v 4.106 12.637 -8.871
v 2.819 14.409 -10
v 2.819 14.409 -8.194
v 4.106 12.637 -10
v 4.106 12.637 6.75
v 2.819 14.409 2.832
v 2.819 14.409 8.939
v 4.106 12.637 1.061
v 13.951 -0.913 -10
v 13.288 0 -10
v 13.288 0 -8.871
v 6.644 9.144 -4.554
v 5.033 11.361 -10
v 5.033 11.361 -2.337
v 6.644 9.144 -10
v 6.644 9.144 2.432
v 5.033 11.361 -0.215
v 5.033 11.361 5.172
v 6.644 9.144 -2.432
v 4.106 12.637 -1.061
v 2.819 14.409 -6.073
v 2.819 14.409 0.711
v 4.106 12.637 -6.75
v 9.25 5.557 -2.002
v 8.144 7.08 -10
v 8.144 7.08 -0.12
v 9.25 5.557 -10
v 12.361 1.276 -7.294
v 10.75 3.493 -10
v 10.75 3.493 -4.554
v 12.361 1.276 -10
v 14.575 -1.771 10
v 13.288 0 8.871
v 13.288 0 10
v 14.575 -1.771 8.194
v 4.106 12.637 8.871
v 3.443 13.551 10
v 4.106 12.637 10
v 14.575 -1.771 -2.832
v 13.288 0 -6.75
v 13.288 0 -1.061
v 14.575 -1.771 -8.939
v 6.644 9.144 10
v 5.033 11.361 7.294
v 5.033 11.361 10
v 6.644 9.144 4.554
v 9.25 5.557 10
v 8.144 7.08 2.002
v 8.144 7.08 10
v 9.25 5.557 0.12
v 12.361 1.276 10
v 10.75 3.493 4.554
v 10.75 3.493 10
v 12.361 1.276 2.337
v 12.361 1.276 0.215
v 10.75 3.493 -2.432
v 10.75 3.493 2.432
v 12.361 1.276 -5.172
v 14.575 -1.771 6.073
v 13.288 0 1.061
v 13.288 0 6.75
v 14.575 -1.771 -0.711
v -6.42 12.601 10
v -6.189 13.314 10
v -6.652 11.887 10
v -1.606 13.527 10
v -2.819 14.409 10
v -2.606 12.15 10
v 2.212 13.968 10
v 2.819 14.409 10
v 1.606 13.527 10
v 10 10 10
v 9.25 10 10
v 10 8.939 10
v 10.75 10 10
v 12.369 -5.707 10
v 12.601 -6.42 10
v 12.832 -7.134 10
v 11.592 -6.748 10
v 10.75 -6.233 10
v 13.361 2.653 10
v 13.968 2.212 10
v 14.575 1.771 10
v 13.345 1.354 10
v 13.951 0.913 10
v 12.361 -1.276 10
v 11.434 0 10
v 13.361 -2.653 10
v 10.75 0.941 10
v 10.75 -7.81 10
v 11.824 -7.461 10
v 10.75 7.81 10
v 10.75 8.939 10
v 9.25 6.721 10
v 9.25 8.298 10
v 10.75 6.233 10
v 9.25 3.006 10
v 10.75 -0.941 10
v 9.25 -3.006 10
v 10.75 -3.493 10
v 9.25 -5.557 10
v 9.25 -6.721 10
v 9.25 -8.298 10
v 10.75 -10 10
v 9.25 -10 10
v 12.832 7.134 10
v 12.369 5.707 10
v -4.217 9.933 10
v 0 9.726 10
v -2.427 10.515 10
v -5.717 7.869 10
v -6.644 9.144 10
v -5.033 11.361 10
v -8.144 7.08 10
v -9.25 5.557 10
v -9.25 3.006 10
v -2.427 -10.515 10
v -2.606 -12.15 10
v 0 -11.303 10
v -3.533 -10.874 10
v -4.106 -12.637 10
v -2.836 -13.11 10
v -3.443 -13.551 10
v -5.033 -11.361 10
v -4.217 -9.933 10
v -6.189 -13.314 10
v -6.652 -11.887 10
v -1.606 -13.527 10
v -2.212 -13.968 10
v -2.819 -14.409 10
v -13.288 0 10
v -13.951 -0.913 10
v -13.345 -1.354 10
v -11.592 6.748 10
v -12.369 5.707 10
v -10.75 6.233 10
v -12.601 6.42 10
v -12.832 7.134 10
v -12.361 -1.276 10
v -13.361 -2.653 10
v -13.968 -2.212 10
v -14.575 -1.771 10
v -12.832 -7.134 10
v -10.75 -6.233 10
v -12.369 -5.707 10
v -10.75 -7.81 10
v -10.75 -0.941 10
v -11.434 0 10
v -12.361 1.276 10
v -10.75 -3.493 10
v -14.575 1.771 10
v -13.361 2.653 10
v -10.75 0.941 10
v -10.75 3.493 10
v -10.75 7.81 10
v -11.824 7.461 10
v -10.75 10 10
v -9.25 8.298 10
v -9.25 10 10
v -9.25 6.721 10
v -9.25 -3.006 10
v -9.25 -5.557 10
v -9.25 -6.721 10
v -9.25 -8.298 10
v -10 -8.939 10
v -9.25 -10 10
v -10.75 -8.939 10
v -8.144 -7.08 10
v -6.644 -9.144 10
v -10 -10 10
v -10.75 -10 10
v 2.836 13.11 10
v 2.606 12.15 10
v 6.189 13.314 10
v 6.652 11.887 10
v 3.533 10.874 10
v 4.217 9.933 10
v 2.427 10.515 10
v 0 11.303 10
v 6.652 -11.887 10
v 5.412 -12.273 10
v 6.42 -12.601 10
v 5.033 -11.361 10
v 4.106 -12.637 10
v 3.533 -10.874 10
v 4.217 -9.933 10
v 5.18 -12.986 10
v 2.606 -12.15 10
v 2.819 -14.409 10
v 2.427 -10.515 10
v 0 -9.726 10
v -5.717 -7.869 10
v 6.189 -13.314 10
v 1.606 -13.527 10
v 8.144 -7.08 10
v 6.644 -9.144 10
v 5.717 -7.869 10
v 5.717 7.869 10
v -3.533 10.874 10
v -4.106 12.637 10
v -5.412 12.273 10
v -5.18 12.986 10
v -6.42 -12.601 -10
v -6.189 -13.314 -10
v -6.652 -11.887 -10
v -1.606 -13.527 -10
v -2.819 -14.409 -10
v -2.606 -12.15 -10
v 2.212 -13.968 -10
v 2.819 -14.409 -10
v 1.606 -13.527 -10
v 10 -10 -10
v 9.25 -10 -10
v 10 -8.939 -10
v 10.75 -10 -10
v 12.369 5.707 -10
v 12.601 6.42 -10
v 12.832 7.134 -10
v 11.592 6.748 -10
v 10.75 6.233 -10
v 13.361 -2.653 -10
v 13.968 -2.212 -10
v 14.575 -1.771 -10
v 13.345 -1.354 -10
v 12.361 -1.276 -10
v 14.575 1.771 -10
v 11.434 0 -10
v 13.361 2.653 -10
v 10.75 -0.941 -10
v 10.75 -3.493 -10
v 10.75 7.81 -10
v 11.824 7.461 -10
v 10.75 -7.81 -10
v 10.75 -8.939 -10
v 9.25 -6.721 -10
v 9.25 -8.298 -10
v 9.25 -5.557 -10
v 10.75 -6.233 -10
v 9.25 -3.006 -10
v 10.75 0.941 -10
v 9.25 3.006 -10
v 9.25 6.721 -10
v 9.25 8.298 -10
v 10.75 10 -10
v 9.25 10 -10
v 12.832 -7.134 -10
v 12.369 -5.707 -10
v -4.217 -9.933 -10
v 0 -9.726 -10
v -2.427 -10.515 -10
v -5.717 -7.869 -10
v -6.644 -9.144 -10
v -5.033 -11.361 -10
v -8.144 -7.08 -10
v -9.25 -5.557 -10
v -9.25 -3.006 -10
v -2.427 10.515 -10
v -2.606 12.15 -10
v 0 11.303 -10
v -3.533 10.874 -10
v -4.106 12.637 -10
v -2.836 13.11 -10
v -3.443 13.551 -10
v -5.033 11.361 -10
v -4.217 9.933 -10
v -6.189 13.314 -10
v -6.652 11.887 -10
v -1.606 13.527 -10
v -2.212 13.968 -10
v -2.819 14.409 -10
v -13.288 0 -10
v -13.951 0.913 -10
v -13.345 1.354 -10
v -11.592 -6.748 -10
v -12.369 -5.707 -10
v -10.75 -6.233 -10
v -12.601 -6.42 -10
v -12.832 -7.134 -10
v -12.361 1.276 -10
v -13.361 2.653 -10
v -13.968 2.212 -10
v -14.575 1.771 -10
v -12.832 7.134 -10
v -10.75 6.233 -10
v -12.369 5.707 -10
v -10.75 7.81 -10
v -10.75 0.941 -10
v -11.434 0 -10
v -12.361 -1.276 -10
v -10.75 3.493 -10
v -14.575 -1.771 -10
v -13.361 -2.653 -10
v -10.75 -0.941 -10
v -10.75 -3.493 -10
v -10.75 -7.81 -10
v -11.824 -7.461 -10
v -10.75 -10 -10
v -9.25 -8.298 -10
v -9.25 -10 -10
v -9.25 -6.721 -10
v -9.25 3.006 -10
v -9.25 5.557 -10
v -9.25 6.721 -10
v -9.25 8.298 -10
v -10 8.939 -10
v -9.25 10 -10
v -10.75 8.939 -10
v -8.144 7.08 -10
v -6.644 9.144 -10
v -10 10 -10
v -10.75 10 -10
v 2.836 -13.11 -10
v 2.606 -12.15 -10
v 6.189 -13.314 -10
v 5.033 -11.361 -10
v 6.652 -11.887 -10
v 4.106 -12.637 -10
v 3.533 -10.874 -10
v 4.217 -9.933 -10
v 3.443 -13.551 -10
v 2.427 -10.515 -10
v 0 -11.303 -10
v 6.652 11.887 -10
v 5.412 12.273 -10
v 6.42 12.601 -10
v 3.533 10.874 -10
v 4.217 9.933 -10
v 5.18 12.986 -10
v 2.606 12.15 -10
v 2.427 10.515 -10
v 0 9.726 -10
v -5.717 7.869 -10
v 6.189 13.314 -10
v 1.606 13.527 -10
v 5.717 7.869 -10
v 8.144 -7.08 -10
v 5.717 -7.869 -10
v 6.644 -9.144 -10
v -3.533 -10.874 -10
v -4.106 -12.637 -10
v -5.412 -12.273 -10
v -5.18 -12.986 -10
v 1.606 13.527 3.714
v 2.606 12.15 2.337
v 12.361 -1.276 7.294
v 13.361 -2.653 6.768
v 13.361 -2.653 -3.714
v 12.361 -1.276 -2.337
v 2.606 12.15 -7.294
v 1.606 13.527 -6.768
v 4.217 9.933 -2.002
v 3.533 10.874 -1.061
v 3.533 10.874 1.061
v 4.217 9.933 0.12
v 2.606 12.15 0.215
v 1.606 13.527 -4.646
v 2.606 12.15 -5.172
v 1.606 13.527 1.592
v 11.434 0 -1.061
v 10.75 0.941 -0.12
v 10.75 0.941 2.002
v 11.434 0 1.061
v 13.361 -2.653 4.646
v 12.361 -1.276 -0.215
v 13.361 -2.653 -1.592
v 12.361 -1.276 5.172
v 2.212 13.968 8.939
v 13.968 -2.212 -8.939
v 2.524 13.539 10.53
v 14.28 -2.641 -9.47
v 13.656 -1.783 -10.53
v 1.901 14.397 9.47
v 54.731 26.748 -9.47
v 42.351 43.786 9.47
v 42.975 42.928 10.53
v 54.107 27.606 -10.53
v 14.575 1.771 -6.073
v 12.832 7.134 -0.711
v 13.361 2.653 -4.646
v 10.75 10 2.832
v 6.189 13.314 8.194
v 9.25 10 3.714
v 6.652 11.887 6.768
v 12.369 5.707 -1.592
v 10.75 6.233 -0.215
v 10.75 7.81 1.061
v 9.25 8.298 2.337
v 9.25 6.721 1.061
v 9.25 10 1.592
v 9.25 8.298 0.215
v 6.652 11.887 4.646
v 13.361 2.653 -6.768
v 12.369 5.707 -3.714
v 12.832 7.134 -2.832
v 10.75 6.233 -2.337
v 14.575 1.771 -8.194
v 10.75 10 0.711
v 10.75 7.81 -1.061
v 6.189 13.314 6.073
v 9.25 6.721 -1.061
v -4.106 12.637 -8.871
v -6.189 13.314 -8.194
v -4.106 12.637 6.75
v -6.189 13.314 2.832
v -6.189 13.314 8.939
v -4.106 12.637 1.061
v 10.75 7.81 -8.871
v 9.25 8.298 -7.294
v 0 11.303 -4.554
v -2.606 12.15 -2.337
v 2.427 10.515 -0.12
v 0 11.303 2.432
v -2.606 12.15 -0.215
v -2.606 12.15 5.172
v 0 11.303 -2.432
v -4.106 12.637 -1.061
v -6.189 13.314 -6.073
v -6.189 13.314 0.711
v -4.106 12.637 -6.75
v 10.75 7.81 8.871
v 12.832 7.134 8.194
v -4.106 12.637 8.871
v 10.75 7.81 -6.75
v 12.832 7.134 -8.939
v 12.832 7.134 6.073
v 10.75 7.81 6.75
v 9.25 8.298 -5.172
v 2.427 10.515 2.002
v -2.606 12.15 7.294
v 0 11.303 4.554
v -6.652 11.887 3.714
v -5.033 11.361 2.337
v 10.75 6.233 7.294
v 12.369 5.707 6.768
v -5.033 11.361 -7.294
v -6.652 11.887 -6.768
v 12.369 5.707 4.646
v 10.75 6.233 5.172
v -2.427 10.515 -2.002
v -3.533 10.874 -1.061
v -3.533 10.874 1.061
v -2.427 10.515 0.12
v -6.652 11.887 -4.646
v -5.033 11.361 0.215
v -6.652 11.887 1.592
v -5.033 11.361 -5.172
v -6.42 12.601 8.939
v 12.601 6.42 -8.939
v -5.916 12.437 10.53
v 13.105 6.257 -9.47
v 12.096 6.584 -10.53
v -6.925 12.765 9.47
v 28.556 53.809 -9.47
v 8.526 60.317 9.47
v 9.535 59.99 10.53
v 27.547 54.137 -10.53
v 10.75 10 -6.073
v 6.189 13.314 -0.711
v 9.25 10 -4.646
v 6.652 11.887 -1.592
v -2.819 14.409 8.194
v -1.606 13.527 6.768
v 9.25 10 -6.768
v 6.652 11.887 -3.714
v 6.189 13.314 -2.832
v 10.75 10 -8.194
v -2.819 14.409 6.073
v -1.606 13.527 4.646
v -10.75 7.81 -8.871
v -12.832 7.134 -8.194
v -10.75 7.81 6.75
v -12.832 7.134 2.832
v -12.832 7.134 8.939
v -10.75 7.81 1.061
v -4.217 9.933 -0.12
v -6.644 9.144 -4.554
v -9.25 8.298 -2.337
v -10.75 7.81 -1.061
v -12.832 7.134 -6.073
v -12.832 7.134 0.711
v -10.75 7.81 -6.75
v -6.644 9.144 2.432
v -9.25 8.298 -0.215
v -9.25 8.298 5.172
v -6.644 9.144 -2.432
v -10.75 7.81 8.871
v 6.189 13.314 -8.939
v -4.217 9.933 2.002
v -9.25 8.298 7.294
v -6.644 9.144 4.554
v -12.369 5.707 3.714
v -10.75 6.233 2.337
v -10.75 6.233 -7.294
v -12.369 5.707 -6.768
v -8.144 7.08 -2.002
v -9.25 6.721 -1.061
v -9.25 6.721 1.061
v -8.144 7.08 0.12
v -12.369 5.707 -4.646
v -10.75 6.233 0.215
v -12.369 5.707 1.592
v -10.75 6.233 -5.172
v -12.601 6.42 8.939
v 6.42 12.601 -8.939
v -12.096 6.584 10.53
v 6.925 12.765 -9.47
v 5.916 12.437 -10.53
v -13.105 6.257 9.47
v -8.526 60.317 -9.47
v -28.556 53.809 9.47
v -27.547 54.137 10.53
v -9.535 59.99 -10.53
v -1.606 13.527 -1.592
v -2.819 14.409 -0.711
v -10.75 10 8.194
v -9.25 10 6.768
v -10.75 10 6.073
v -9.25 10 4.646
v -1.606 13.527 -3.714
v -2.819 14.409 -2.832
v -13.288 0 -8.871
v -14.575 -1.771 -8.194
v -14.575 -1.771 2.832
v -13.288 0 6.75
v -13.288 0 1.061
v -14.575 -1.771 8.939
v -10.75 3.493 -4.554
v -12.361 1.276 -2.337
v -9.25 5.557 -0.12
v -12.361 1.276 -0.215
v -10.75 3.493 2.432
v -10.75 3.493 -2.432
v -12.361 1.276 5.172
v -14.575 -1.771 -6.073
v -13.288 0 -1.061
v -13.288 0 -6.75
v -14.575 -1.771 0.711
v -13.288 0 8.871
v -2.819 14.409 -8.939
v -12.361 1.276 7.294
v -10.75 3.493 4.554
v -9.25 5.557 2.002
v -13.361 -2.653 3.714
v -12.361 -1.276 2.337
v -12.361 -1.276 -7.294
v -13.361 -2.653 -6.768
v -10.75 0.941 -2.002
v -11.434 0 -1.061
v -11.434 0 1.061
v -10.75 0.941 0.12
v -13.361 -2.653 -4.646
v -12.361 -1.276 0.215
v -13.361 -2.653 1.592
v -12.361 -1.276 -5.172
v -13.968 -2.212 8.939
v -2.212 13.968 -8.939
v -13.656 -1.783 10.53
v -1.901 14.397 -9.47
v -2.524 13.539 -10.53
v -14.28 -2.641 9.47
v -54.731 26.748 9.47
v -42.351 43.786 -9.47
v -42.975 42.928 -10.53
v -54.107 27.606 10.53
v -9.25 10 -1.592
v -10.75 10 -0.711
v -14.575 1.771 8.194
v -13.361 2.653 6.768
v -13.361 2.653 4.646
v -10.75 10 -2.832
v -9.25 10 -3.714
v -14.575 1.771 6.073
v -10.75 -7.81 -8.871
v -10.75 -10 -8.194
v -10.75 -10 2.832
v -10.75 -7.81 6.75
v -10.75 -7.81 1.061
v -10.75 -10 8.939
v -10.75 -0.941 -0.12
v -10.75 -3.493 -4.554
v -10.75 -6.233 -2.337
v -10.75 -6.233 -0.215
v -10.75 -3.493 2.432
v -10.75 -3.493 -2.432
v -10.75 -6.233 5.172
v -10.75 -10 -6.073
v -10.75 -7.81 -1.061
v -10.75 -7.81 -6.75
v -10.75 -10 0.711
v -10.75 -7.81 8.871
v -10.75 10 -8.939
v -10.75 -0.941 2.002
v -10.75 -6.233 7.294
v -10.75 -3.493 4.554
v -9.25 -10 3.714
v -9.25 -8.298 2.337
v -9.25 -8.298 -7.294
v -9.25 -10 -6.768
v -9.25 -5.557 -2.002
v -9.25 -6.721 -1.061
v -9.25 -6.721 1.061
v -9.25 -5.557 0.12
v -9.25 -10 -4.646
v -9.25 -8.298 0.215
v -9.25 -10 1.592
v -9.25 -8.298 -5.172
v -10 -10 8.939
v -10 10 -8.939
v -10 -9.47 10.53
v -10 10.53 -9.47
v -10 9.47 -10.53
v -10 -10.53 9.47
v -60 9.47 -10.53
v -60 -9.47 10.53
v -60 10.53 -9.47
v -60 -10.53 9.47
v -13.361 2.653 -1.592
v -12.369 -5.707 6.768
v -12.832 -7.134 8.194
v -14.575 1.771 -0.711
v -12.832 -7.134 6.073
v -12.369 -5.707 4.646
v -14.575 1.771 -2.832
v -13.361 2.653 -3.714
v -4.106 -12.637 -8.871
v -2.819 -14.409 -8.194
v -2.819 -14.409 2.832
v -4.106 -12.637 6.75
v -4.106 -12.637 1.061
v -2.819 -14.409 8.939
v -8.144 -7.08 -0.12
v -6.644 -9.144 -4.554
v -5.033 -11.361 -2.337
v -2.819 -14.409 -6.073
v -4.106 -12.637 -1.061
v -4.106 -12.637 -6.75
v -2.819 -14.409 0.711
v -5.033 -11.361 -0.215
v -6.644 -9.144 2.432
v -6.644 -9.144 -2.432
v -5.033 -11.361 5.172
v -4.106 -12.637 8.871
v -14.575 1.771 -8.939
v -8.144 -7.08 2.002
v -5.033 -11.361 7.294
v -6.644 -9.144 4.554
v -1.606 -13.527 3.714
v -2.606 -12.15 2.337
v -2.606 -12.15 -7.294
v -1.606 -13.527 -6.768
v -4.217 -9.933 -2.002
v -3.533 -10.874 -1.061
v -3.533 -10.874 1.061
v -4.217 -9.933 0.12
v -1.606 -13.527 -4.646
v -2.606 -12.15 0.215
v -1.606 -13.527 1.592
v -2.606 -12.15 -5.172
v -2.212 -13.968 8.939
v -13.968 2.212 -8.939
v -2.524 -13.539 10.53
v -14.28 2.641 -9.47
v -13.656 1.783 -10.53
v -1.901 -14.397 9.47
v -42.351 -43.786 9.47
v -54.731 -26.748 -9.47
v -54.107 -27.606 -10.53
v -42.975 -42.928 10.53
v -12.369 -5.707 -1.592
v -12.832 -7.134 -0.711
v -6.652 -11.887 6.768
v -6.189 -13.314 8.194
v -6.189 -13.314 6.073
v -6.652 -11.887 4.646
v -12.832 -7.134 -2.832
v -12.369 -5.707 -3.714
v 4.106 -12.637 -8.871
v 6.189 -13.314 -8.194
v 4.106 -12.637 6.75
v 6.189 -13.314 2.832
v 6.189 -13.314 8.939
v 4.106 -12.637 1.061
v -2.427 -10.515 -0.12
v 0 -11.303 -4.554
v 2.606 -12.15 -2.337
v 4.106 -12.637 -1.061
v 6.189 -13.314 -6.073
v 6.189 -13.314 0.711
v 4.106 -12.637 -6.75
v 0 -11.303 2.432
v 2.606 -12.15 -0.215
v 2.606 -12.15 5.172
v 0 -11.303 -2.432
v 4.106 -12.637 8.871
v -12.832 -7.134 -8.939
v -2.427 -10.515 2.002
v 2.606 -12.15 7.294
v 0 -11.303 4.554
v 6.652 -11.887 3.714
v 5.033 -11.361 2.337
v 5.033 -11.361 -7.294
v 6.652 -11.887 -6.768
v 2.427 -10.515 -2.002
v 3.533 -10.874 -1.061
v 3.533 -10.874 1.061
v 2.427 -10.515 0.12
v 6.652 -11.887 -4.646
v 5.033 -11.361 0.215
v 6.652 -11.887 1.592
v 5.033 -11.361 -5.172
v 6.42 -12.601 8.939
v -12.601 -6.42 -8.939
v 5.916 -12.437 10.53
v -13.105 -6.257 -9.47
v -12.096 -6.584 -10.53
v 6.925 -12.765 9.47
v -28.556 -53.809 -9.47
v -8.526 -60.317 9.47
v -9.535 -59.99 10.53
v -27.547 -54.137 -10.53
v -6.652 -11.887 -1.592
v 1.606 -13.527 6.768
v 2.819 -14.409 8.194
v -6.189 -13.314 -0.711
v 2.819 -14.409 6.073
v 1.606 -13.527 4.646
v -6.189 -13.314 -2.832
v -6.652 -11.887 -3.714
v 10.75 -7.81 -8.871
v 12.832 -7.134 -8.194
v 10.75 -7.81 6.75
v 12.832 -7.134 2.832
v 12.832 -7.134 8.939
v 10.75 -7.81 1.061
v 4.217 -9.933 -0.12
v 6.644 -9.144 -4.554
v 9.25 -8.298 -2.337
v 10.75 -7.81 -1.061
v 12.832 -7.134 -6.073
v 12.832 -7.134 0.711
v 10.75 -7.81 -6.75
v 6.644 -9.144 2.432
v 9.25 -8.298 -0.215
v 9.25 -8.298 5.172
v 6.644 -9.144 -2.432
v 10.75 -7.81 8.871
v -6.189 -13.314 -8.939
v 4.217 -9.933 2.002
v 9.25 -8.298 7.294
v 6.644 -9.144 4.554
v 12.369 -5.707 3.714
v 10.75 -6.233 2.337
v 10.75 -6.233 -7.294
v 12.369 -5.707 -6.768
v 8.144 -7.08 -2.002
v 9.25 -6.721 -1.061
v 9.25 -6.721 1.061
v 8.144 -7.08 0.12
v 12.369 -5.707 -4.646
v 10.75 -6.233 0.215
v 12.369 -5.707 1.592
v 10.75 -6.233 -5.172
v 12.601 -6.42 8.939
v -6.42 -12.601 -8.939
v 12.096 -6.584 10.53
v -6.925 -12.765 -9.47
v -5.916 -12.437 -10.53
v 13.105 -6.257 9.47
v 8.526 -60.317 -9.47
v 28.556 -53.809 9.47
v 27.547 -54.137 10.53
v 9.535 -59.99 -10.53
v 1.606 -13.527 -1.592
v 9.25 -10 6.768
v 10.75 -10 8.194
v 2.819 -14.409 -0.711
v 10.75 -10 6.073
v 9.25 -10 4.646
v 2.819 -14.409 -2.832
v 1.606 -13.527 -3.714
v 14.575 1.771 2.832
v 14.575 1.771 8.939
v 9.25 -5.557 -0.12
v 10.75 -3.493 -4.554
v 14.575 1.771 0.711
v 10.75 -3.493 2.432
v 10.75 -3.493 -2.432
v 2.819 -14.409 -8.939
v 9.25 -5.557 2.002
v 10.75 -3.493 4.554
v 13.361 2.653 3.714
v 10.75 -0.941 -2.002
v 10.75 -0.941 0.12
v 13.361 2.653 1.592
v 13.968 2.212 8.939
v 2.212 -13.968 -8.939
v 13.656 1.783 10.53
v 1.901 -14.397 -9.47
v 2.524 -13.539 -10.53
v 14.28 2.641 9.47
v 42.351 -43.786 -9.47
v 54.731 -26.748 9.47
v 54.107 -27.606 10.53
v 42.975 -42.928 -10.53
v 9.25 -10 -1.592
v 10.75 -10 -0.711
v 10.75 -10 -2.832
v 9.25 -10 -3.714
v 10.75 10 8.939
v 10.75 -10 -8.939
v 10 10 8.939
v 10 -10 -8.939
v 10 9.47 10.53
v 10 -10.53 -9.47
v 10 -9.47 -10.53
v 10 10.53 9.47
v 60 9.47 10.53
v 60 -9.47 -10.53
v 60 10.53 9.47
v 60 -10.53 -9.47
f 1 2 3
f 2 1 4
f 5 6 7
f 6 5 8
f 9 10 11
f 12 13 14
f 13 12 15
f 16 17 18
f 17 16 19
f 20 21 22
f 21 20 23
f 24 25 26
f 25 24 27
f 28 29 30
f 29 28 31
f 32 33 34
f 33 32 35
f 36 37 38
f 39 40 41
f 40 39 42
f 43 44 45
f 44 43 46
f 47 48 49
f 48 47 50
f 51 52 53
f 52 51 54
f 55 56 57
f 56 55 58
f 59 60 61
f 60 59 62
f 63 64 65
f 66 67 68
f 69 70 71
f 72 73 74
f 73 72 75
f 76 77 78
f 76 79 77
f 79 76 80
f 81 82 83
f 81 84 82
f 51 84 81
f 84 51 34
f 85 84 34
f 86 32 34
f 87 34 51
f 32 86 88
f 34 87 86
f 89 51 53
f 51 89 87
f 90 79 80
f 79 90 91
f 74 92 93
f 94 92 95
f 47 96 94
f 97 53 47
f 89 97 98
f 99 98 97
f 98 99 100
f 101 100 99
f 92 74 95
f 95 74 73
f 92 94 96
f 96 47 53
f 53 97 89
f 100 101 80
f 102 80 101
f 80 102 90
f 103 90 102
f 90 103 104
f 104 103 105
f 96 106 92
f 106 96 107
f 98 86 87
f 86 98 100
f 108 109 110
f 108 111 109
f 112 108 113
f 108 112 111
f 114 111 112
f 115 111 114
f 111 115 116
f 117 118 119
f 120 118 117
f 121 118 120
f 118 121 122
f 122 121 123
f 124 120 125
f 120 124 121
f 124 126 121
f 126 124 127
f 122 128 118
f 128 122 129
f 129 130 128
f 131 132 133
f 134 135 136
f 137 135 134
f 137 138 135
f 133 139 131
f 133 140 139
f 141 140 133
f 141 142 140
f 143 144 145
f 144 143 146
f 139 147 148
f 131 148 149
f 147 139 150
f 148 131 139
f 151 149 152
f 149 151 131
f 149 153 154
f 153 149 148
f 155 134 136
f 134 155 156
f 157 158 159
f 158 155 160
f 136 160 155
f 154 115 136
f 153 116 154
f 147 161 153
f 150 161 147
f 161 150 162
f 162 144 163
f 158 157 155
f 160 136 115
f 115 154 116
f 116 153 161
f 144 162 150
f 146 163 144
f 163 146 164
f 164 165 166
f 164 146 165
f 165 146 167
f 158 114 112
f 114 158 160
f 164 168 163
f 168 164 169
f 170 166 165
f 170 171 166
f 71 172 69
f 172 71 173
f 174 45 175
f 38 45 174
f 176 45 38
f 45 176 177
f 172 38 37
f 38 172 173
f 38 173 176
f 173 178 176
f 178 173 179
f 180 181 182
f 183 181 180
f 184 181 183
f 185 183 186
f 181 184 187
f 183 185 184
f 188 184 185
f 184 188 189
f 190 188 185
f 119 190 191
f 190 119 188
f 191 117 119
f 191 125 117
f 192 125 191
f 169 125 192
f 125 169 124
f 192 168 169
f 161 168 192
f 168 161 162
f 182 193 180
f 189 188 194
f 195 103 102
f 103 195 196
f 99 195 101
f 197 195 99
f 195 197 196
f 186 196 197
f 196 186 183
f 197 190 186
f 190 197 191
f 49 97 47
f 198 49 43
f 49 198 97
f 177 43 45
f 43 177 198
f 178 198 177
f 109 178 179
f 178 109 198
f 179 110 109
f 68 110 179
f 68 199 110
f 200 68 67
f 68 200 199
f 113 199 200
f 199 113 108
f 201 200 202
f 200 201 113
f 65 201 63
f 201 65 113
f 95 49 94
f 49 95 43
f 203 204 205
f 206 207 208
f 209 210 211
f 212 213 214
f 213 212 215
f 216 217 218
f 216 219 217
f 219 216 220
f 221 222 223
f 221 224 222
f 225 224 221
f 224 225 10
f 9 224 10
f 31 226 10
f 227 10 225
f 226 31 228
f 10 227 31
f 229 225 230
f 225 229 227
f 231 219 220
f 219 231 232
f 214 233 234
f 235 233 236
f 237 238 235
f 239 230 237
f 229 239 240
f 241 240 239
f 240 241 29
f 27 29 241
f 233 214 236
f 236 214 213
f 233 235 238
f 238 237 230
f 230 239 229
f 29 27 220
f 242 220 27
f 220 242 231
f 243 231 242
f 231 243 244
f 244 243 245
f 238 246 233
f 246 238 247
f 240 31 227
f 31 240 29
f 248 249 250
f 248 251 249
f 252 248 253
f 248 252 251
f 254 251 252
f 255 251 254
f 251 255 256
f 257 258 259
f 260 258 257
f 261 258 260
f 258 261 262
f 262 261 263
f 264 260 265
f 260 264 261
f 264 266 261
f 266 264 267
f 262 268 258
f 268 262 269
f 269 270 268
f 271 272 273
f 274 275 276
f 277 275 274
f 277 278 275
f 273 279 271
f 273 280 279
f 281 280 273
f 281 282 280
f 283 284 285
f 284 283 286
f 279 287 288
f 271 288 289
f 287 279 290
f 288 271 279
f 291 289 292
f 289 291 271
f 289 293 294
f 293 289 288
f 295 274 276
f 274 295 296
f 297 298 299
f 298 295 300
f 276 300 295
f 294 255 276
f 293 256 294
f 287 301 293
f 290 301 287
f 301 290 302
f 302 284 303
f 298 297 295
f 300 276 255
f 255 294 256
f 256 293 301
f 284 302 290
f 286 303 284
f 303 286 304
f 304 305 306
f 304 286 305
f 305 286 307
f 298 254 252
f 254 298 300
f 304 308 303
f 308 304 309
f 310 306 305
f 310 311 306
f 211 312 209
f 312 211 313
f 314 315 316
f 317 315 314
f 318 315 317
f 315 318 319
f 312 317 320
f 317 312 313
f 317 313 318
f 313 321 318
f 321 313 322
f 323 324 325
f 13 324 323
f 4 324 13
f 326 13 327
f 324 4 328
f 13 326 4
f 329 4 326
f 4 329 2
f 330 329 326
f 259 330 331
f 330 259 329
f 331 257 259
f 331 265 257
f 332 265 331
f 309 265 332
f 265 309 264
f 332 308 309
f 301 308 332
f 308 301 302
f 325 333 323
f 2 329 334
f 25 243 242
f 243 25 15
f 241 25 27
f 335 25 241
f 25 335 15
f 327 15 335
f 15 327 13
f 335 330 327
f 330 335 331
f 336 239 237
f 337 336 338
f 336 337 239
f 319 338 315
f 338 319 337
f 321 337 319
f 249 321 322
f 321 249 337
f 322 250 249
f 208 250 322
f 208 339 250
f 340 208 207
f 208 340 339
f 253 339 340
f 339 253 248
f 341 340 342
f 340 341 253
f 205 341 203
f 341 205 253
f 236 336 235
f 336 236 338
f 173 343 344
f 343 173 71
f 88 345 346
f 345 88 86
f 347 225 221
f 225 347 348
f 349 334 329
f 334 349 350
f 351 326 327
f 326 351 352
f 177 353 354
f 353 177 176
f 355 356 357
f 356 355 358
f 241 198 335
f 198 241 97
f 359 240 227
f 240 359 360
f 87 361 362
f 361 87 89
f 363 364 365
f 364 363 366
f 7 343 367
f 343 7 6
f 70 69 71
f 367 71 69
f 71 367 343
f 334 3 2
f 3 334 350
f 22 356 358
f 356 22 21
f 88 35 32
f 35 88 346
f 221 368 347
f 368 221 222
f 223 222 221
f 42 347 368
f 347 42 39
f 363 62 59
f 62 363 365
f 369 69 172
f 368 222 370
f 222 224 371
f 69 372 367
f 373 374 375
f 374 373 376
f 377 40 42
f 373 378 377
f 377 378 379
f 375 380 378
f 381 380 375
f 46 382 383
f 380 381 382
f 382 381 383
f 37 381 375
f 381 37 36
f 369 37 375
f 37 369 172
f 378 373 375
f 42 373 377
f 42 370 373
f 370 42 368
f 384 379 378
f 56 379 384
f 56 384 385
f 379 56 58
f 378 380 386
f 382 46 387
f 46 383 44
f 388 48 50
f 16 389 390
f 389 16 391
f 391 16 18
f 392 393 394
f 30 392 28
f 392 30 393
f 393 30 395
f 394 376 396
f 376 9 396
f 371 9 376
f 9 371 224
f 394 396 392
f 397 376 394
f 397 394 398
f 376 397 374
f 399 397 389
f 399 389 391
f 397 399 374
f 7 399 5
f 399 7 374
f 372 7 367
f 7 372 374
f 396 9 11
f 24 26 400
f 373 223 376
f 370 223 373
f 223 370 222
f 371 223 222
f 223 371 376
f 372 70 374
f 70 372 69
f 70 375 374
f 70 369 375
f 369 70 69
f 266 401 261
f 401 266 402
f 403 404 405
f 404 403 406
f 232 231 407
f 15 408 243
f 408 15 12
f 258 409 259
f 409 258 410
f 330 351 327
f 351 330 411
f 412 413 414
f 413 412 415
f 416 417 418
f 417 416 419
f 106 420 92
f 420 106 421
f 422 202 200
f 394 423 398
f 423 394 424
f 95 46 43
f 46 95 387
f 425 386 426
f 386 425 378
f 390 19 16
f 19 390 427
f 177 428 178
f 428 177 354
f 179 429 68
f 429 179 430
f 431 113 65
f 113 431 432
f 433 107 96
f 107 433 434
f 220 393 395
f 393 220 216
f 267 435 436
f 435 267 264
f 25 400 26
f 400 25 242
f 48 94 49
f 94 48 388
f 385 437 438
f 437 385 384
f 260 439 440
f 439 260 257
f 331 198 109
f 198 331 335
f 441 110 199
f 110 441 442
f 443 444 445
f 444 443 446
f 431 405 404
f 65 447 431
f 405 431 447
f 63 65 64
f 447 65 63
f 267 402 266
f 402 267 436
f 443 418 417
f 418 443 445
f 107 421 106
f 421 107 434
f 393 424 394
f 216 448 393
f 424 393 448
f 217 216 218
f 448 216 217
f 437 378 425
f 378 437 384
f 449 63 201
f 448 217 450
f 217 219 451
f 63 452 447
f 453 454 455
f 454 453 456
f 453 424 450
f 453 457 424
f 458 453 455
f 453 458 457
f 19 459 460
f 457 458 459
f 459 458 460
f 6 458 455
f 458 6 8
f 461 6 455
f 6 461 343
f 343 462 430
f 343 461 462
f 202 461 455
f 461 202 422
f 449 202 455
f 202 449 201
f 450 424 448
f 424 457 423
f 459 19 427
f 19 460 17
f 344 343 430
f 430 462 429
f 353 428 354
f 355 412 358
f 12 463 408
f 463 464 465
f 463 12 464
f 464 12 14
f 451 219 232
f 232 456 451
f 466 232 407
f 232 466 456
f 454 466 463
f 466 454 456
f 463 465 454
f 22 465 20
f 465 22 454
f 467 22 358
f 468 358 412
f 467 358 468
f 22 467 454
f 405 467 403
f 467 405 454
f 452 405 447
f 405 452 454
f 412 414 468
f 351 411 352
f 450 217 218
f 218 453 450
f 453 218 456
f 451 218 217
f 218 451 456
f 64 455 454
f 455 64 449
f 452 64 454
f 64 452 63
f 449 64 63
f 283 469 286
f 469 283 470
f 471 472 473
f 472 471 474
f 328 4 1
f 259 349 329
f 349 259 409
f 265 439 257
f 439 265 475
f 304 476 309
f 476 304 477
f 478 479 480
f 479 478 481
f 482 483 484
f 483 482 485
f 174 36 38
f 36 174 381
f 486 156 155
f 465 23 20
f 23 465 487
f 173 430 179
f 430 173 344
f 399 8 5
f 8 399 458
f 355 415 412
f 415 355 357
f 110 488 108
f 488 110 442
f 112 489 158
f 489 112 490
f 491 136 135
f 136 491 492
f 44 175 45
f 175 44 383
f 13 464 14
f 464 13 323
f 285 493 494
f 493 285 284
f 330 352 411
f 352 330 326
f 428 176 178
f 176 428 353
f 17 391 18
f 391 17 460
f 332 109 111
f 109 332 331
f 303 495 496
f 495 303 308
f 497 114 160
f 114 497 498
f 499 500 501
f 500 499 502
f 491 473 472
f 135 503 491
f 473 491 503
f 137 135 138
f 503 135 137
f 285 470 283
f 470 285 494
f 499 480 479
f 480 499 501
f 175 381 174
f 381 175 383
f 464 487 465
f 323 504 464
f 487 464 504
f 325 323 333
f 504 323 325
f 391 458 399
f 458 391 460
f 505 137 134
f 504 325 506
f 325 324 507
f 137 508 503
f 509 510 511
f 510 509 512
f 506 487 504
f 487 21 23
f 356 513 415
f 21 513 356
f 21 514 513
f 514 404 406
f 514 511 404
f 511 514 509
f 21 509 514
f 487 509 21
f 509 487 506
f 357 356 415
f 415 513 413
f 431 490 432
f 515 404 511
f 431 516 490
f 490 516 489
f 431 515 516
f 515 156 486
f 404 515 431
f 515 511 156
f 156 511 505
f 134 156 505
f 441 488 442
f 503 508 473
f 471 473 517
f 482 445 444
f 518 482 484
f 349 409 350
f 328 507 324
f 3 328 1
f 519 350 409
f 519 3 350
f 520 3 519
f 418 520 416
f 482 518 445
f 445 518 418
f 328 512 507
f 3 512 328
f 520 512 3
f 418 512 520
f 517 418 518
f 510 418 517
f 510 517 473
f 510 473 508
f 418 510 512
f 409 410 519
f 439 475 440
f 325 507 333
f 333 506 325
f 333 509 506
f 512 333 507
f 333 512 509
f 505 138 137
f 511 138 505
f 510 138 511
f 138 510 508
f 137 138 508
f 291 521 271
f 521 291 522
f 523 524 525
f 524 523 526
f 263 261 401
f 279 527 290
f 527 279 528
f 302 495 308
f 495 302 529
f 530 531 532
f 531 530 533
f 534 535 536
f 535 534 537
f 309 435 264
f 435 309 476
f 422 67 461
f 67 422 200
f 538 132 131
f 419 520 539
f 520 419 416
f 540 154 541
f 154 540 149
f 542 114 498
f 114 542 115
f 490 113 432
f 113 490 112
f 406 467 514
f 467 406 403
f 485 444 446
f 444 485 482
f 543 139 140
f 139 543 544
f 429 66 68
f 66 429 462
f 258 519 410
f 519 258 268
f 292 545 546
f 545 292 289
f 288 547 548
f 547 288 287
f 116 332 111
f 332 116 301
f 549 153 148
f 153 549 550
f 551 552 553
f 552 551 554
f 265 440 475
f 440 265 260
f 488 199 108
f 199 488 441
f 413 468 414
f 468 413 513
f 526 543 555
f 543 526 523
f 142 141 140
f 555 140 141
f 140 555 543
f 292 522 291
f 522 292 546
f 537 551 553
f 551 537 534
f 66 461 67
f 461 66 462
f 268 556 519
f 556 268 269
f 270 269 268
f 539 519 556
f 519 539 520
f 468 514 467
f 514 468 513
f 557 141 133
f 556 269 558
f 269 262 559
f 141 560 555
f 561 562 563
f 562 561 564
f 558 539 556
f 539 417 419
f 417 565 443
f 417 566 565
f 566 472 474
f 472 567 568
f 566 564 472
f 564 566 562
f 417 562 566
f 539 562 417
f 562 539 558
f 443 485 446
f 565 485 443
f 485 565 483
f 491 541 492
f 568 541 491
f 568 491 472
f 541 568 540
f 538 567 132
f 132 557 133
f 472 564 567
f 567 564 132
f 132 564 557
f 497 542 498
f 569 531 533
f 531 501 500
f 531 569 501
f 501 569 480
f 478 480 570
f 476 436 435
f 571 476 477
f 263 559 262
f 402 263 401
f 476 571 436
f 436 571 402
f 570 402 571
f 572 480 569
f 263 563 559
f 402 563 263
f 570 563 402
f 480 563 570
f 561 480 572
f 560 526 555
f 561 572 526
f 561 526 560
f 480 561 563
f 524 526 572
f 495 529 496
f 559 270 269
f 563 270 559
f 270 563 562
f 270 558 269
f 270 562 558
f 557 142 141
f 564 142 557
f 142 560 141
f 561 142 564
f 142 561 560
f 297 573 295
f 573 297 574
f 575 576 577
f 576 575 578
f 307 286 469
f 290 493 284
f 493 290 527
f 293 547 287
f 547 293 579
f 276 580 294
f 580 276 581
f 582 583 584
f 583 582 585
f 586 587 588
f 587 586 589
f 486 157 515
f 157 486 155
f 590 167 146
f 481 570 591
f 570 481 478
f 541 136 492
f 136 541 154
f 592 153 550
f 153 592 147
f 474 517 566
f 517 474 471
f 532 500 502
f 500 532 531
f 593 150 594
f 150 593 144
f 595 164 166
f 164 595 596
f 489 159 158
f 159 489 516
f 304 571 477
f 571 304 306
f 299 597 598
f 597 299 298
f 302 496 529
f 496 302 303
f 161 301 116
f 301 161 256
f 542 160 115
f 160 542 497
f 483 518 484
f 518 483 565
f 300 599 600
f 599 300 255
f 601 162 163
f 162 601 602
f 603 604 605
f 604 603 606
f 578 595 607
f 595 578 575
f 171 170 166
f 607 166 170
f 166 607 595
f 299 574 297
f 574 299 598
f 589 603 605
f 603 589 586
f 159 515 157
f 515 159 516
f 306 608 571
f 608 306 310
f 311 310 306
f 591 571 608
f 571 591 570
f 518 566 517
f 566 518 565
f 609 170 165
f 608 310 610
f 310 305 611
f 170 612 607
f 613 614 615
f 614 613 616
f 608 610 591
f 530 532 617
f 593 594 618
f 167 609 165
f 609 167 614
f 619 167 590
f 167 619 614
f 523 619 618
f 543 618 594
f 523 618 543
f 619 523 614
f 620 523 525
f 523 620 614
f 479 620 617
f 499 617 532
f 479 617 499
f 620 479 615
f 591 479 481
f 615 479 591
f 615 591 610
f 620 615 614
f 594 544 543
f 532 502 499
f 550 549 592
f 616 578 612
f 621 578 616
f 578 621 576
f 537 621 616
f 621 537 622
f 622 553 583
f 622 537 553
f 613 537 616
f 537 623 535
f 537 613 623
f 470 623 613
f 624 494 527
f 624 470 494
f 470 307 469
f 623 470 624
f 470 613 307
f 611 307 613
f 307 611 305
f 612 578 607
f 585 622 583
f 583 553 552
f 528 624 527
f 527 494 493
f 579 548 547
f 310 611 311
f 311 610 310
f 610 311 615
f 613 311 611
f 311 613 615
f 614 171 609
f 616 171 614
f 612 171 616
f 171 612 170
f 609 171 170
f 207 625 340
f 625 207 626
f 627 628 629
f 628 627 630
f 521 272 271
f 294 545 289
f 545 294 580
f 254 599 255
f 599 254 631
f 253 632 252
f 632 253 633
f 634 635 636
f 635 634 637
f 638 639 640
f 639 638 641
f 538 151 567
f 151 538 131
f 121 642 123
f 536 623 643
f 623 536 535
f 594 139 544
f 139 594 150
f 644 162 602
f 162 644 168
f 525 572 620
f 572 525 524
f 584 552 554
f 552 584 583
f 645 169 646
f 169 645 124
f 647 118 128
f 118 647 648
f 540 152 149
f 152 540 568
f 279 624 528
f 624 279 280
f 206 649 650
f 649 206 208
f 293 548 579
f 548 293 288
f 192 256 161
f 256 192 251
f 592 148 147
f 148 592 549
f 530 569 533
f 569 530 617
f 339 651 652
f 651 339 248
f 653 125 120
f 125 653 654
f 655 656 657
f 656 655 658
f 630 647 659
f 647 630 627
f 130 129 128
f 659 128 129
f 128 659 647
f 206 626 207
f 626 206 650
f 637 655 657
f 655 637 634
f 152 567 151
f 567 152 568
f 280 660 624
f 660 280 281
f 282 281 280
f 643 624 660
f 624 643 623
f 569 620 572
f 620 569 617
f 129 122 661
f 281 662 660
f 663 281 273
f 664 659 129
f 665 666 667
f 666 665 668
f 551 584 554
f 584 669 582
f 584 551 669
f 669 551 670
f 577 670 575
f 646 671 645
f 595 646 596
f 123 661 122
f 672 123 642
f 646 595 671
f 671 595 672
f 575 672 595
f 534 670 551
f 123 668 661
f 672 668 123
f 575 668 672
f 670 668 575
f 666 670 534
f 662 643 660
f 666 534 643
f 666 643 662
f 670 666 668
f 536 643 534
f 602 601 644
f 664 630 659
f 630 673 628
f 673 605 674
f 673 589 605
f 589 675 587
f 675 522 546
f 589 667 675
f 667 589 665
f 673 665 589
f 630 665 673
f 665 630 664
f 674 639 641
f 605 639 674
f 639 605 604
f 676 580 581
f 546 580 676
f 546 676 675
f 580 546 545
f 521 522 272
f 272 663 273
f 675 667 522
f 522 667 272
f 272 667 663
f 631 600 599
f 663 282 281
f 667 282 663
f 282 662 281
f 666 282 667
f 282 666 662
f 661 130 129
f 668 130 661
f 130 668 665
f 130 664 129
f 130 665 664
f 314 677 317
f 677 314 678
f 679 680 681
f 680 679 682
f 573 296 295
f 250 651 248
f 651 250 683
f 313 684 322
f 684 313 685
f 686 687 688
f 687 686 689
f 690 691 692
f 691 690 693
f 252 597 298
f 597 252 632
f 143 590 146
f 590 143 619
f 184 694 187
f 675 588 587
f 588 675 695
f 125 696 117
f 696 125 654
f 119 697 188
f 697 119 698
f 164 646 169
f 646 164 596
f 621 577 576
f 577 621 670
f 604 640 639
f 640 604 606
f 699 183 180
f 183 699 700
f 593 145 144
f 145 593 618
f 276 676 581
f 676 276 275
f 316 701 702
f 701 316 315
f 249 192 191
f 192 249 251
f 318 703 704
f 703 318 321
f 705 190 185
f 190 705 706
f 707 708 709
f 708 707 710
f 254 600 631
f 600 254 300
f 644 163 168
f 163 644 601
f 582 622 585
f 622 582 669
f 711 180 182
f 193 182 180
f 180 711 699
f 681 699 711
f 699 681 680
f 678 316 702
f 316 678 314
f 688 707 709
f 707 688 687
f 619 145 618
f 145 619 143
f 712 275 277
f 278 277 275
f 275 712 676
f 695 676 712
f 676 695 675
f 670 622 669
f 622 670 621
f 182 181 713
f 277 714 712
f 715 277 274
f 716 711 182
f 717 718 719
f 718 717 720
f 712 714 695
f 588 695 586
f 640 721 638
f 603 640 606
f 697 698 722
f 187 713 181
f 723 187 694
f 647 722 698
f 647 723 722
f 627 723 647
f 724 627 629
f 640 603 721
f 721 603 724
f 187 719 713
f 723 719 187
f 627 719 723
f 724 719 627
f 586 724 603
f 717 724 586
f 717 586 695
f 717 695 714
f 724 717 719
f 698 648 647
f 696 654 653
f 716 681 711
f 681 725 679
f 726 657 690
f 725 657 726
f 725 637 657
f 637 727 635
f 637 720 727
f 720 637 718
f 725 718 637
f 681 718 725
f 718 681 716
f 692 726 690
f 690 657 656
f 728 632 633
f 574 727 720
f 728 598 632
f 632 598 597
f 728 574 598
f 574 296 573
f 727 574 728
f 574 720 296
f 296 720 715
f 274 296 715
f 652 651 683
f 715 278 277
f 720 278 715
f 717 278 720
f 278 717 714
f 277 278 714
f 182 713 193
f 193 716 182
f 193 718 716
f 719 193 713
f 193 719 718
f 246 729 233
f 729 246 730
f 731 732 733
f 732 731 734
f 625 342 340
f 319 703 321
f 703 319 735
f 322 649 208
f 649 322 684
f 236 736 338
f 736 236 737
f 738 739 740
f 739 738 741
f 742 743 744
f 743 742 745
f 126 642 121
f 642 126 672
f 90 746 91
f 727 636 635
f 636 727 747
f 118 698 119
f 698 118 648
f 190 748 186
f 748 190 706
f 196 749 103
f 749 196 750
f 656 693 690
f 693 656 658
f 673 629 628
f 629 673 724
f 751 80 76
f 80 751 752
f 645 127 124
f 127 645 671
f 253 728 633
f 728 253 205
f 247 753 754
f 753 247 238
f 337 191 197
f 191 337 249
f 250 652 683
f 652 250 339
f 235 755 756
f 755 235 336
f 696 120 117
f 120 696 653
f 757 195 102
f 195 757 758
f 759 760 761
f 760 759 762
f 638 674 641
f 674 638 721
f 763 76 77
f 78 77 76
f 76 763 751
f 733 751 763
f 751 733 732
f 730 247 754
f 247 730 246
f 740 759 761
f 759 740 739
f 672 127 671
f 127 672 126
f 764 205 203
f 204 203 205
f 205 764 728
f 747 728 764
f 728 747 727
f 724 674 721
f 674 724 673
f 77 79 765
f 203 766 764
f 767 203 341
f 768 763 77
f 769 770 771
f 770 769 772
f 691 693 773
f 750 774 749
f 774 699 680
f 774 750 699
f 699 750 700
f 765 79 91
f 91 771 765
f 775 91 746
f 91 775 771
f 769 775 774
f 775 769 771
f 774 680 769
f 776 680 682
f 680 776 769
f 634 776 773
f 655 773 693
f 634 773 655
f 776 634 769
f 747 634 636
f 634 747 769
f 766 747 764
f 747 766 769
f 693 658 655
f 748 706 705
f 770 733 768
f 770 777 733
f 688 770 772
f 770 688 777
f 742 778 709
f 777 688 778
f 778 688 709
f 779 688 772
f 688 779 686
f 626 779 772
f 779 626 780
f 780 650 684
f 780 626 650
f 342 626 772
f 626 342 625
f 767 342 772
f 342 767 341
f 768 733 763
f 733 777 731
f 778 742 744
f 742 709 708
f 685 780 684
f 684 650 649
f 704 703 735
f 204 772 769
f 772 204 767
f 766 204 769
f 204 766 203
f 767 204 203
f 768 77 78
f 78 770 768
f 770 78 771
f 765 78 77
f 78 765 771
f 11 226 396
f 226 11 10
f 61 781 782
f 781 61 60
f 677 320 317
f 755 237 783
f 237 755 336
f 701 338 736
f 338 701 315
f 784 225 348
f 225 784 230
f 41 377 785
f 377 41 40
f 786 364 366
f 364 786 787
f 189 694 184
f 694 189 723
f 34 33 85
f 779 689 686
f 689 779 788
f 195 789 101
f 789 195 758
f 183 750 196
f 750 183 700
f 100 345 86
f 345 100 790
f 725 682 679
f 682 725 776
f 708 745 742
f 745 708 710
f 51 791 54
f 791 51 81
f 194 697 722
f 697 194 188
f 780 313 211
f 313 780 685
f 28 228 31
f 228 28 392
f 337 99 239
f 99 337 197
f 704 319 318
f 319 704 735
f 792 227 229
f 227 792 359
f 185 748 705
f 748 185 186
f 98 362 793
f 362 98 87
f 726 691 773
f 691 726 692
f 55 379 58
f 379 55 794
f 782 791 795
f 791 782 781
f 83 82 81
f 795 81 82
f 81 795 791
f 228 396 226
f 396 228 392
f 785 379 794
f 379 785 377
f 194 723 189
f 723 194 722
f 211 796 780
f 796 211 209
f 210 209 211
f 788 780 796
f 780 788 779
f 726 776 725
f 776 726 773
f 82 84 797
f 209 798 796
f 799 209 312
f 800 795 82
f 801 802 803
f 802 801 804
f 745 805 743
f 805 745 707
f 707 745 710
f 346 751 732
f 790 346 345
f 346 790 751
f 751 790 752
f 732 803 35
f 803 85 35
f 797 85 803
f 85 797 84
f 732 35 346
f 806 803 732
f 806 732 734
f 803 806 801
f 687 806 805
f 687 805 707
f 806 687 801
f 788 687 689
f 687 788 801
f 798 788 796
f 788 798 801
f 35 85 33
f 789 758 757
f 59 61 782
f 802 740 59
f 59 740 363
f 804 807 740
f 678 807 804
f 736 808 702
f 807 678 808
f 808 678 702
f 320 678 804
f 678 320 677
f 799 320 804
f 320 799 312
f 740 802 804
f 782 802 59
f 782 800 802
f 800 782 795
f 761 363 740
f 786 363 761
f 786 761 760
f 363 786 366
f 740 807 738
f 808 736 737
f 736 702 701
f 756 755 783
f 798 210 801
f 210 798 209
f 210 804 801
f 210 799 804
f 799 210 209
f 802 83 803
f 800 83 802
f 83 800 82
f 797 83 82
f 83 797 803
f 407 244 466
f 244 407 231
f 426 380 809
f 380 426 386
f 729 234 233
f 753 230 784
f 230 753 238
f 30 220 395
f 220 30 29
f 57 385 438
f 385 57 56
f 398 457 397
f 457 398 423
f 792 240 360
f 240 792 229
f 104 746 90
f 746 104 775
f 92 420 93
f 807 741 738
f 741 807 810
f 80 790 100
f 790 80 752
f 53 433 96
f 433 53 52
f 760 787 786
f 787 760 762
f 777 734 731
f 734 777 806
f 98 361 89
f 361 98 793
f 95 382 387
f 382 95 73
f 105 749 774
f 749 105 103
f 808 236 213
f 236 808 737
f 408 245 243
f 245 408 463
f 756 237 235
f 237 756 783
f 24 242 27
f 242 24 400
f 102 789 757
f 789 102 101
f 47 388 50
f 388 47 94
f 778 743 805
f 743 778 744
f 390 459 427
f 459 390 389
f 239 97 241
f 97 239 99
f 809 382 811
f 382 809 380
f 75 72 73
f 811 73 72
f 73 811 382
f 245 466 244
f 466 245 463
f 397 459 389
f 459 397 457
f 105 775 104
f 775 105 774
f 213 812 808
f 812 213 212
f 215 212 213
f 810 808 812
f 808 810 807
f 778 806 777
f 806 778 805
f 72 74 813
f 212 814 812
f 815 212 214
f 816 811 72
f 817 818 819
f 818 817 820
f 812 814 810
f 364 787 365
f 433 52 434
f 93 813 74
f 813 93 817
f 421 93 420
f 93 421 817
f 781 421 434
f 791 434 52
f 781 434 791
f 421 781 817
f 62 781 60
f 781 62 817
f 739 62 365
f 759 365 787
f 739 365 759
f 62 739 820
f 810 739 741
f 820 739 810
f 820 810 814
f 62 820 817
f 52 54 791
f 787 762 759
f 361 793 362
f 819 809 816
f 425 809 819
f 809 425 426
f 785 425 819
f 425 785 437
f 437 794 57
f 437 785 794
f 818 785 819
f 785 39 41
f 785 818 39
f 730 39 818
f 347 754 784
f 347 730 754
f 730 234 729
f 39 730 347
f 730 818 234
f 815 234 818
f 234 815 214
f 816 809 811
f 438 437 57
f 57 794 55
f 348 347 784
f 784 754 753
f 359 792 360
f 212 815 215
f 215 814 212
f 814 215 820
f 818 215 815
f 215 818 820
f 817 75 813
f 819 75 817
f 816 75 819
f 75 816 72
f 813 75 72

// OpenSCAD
RaioDoHelice = 60;
RaioDoCentro = 10;
Altura = 20;
Espessura = 1.5;
NumeroDePas = 10;

ComprimentoPa = RaioDoHelice-RaioDoCentro;
LarguraDaPa = Altura * sqrt(2);

for(i=[1:NumeroDePas]){
    rotate([0,0,i*360/NumeroDePas])
    translate([RaioDoCentro,0,0]){
        cube([Espessura,Altura,Altura],center = true);
        translate([ComprimentoPa/2,0,0])
            rotate([45,0,0])
                cube([ComprimentoPa,LarguraDaPa,Espessura],center=true);
        }
    }
